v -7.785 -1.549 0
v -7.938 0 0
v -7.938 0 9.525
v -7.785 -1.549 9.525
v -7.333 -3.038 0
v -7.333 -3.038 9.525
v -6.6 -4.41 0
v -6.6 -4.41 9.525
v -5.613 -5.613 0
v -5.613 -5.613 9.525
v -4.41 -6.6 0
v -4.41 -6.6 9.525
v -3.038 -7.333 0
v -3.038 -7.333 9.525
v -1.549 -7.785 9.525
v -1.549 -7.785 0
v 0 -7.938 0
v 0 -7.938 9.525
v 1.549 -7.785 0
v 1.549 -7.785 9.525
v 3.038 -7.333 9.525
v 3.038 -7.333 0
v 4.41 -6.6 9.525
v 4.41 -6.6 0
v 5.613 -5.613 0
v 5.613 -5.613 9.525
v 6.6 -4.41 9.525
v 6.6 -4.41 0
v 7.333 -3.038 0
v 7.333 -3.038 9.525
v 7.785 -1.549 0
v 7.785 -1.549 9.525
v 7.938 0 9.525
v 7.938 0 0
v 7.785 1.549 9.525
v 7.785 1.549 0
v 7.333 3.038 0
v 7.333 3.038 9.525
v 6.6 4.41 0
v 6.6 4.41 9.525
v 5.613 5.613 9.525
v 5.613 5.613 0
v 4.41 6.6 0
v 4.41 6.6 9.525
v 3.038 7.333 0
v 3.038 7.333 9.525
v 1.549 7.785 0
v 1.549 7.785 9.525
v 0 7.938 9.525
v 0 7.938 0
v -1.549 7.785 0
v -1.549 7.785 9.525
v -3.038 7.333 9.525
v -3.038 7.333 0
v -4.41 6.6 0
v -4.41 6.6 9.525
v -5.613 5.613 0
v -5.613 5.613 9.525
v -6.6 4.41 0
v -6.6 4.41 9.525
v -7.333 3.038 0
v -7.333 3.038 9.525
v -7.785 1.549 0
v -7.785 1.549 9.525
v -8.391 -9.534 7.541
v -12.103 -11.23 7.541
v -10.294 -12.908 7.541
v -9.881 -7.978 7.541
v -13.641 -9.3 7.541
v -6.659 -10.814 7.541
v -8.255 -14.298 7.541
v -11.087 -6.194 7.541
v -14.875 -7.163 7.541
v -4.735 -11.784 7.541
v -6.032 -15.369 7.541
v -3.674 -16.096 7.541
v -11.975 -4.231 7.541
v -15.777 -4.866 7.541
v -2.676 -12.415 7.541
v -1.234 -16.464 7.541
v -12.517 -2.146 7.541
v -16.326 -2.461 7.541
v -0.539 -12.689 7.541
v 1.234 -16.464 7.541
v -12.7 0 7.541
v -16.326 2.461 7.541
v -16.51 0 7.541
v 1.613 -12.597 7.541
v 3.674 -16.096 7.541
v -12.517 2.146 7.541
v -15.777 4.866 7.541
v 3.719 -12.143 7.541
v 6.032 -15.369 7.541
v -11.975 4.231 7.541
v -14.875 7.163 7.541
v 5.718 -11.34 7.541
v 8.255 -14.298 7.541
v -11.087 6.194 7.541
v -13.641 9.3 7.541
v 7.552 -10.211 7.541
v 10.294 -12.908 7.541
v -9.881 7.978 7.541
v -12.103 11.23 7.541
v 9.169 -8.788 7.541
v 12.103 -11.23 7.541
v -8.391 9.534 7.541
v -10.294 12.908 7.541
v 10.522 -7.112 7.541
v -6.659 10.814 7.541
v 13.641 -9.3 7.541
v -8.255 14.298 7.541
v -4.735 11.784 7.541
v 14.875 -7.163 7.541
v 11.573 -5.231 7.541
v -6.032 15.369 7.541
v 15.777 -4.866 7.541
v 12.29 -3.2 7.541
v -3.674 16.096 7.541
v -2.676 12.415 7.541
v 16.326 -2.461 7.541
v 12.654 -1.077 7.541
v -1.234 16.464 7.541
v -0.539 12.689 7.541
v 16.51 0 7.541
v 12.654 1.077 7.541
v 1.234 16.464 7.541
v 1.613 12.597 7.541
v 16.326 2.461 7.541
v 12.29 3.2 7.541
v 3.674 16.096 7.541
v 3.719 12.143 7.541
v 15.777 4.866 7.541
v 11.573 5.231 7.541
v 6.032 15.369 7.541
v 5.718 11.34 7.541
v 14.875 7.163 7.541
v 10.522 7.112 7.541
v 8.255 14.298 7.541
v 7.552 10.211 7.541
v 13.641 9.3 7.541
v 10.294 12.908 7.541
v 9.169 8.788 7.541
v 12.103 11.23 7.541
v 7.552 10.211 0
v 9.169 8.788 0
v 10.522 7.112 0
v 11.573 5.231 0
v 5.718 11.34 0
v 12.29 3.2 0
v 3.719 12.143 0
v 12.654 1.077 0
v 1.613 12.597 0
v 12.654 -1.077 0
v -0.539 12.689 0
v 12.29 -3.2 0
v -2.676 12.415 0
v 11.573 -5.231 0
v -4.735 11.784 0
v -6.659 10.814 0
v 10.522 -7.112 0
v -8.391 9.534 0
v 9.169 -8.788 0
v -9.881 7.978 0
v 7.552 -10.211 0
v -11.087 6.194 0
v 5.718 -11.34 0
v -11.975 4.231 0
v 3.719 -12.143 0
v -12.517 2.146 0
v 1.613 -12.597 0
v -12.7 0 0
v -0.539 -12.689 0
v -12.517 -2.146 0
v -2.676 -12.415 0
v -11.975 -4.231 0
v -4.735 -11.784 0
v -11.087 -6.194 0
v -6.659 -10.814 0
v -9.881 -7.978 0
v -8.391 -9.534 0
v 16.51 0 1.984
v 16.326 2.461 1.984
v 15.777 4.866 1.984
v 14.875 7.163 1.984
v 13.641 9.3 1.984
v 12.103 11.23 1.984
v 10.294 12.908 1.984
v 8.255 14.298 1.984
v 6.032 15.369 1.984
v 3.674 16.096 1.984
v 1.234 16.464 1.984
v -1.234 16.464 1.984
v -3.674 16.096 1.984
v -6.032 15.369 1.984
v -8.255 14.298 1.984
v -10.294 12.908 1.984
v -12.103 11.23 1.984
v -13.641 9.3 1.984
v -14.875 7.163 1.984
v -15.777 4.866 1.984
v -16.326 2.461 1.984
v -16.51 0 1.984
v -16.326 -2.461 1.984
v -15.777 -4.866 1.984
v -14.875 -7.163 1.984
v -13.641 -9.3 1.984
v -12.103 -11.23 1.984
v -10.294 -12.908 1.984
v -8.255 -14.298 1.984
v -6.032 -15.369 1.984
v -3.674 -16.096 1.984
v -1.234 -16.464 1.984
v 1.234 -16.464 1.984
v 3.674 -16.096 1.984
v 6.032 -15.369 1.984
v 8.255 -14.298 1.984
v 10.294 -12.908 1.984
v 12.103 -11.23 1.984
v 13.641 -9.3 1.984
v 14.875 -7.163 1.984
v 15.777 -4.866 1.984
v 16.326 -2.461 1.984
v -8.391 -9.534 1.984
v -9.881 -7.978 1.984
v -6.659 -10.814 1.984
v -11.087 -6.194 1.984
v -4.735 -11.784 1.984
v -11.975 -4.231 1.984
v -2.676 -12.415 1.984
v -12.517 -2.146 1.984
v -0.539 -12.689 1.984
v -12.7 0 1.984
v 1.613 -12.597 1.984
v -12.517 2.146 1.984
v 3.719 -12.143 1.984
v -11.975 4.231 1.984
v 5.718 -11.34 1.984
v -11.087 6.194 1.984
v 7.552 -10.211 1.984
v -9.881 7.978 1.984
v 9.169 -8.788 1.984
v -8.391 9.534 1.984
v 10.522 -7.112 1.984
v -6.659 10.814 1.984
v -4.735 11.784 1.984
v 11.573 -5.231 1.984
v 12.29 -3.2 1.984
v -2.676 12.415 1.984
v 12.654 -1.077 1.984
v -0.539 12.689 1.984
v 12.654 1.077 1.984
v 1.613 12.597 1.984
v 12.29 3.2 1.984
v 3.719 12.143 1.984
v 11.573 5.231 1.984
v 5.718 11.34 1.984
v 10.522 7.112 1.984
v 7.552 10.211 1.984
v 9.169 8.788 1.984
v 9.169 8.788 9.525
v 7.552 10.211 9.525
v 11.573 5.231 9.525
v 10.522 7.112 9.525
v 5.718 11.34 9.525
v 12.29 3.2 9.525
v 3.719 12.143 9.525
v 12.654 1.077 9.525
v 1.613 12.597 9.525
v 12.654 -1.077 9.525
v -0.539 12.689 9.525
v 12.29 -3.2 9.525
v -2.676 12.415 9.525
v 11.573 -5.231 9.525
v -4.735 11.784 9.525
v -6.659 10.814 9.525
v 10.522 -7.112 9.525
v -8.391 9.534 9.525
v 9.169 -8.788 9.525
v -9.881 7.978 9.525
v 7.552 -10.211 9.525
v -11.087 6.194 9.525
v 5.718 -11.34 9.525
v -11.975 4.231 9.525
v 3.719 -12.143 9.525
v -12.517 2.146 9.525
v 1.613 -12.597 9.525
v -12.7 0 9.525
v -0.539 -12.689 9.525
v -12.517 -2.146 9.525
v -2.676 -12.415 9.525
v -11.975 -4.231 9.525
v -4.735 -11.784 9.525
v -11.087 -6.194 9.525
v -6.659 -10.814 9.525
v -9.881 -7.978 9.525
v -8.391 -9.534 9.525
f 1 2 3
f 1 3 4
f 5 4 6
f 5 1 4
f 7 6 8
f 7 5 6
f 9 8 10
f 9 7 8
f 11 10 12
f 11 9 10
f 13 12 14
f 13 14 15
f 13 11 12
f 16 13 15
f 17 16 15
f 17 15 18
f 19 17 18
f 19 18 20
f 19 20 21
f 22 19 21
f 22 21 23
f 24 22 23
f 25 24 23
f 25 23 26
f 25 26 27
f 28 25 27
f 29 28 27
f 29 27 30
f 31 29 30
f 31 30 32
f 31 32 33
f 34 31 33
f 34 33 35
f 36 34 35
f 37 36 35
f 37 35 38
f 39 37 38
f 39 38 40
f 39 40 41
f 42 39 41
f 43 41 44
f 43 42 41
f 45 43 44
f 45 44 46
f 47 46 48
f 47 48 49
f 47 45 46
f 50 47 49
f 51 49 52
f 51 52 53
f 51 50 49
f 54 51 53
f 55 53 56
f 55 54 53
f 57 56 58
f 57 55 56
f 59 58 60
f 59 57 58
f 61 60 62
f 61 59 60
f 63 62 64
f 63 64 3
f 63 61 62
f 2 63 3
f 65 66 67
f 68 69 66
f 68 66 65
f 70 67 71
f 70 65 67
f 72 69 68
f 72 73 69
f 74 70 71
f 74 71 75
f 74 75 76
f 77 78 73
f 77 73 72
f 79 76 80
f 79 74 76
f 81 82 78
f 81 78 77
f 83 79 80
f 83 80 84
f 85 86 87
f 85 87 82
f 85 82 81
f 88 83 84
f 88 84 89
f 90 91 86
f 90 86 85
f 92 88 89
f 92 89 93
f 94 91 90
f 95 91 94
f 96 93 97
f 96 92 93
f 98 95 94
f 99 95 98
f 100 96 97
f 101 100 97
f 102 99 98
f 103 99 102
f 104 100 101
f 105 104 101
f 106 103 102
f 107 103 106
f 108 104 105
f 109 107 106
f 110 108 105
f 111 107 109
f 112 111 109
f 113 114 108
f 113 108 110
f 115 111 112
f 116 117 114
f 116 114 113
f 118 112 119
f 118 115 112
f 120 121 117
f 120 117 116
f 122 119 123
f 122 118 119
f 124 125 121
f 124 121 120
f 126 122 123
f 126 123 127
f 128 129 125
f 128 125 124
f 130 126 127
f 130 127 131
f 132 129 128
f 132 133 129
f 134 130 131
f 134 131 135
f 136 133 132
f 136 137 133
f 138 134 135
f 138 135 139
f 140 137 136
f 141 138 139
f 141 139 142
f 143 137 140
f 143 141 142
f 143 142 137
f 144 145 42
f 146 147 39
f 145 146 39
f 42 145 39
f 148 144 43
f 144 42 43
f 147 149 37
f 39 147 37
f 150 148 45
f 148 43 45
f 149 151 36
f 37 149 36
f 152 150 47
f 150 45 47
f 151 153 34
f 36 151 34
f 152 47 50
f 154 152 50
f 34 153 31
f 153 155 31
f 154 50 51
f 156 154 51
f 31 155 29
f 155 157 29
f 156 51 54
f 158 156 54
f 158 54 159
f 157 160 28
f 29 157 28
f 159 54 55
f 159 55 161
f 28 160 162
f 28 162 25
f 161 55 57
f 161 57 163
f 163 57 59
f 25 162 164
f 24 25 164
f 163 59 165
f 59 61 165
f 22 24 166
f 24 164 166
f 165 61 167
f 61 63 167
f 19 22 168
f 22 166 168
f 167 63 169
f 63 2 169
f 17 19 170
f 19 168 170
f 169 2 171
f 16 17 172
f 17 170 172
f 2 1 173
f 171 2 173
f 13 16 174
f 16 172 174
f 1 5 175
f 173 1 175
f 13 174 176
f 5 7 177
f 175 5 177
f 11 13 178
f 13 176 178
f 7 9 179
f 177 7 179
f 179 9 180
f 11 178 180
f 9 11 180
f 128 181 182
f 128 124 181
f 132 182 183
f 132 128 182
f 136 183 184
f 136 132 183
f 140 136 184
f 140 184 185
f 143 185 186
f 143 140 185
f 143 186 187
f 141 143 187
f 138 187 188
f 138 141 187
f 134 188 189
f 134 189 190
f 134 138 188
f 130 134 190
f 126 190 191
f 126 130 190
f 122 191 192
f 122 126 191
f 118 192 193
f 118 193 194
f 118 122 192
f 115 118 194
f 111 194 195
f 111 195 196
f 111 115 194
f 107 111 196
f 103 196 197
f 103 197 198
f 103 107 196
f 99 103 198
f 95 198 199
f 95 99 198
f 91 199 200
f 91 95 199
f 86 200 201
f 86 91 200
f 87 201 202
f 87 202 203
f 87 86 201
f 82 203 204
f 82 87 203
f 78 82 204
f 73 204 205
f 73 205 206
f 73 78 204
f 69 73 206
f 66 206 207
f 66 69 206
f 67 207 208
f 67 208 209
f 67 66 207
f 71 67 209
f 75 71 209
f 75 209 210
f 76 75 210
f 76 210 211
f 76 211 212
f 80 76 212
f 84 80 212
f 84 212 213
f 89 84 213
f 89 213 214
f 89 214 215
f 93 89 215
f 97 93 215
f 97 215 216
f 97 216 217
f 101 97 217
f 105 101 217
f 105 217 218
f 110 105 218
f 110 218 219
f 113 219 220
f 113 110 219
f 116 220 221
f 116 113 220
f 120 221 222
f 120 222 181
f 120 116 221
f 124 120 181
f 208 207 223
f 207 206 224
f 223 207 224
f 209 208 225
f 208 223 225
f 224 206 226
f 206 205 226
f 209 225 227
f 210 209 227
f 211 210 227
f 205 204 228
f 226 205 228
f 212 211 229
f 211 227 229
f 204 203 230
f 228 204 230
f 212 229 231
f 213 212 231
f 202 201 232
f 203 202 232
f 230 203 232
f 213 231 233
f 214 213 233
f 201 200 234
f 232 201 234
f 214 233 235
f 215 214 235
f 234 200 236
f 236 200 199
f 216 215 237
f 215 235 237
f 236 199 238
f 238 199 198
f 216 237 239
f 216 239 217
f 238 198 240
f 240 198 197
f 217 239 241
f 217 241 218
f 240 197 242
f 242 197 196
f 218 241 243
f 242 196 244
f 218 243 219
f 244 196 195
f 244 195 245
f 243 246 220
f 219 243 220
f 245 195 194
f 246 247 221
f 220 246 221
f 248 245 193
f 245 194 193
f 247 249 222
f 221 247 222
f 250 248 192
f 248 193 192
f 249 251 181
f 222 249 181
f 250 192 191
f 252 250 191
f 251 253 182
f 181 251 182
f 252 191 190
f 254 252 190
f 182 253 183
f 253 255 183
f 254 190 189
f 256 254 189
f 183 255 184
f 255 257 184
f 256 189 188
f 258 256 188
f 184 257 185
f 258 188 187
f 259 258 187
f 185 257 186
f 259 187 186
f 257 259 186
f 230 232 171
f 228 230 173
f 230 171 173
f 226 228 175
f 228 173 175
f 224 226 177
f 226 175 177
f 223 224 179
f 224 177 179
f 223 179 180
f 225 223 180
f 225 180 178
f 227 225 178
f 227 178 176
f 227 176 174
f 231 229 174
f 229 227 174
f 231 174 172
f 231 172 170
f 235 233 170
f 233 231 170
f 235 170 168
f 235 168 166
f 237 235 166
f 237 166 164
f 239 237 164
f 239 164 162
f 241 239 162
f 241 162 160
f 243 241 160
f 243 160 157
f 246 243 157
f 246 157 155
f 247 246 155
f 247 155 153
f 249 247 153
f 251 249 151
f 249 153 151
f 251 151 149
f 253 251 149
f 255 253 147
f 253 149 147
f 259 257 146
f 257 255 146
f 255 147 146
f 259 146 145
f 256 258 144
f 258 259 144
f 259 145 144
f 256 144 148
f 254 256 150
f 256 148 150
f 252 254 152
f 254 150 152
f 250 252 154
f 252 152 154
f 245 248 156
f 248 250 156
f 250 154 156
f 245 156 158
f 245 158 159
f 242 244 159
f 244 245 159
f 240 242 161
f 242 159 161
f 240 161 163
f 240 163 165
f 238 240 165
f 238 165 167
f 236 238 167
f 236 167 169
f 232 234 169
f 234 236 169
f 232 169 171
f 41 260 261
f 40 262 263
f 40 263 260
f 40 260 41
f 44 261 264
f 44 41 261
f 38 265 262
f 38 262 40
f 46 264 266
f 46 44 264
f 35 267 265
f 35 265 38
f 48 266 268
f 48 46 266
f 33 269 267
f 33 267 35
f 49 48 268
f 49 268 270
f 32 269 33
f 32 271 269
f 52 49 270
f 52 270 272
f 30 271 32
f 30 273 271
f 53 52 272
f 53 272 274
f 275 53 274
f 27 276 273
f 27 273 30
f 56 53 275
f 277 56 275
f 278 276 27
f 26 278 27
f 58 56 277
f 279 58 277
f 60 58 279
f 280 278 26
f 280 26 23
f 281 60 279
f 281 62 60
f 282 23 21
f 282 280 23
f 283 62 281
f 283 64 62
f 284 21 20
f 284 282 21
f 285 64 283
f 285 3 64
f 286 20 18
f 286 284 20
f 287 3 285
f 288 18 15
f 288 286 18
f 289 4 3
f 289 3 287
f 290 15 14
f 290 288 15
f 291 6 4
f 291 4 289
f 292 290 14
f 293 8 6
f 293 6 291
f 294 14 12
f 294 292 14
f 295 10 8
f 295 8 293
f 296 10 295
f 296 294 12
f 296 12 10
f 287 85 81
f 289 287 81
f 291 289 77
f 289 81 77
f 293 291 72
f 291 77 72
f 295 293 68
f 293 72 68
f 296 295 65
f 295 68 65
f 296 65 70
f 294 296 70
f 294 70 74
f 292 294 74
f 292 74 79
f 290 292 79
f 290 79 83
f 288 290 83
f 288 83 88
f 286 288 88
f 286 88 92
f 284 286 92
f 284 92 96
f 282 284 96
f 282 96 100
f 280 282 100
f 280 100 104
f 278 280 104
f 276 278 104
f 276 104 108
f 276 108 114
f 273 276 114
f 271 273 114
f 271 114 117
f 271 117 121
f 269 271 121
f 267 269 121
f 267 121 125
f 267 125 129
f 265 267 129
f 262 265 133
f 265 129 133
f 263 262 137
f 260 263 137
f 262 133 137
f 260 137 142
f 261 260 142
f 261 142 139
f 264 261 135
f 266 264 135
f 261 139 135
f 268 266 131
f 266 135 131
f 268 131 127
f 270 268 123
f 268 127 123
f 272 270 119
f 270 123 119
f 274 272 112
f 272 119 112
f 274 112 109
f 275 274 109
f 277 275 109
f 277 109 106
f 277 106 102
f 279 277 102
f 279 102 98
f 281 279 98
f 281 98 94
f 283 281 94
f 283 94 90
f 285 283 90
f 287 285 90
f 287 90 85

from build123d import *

# Parameters (mm, degrees)
SKETCH1_R           = 12.7
SKETCH1_R_2         = 7.9375
BOSS_EXTRUDE1_DEPTH = 9.525
SKETCH2_R           = 16.51
SKETCH2_R_2         = 7.9375
BOSS_EXTRUDE2_DEPTH = 2.778125


with BuildPart() as part:
    # Sketch1 → Boss-Extrude1 (new body)
    with BuildSketch(Plane.XY):
        with Locations(Location((0, 0, 0), (0, 0, 180))):
            Circle(SKETCH1_R)
        with Locations(Location((0, 0, 0), (0, 0, 180))):
            Circle(SKETCH1_R_2, mode=Mode.SUBTRACT)
    extrude(amount=BOSS_EXTRUDE1_DEPTH)

    # Sketch2 → Boss-Extrude2 (add, symmetric)
    with BuildSketch(Plane.XY.offset(4.7625)):
        Circle(SKETCH2_R)
        with Locations(Location((0, 0, 0), (0, 0, 180))):
            Circle(SKETCH2_R_2, mode=Mode.SUBTRACT)
    extrude(amount=BOSS_EXTRUDE2_DEPTH, both=True)


solid = part.part
